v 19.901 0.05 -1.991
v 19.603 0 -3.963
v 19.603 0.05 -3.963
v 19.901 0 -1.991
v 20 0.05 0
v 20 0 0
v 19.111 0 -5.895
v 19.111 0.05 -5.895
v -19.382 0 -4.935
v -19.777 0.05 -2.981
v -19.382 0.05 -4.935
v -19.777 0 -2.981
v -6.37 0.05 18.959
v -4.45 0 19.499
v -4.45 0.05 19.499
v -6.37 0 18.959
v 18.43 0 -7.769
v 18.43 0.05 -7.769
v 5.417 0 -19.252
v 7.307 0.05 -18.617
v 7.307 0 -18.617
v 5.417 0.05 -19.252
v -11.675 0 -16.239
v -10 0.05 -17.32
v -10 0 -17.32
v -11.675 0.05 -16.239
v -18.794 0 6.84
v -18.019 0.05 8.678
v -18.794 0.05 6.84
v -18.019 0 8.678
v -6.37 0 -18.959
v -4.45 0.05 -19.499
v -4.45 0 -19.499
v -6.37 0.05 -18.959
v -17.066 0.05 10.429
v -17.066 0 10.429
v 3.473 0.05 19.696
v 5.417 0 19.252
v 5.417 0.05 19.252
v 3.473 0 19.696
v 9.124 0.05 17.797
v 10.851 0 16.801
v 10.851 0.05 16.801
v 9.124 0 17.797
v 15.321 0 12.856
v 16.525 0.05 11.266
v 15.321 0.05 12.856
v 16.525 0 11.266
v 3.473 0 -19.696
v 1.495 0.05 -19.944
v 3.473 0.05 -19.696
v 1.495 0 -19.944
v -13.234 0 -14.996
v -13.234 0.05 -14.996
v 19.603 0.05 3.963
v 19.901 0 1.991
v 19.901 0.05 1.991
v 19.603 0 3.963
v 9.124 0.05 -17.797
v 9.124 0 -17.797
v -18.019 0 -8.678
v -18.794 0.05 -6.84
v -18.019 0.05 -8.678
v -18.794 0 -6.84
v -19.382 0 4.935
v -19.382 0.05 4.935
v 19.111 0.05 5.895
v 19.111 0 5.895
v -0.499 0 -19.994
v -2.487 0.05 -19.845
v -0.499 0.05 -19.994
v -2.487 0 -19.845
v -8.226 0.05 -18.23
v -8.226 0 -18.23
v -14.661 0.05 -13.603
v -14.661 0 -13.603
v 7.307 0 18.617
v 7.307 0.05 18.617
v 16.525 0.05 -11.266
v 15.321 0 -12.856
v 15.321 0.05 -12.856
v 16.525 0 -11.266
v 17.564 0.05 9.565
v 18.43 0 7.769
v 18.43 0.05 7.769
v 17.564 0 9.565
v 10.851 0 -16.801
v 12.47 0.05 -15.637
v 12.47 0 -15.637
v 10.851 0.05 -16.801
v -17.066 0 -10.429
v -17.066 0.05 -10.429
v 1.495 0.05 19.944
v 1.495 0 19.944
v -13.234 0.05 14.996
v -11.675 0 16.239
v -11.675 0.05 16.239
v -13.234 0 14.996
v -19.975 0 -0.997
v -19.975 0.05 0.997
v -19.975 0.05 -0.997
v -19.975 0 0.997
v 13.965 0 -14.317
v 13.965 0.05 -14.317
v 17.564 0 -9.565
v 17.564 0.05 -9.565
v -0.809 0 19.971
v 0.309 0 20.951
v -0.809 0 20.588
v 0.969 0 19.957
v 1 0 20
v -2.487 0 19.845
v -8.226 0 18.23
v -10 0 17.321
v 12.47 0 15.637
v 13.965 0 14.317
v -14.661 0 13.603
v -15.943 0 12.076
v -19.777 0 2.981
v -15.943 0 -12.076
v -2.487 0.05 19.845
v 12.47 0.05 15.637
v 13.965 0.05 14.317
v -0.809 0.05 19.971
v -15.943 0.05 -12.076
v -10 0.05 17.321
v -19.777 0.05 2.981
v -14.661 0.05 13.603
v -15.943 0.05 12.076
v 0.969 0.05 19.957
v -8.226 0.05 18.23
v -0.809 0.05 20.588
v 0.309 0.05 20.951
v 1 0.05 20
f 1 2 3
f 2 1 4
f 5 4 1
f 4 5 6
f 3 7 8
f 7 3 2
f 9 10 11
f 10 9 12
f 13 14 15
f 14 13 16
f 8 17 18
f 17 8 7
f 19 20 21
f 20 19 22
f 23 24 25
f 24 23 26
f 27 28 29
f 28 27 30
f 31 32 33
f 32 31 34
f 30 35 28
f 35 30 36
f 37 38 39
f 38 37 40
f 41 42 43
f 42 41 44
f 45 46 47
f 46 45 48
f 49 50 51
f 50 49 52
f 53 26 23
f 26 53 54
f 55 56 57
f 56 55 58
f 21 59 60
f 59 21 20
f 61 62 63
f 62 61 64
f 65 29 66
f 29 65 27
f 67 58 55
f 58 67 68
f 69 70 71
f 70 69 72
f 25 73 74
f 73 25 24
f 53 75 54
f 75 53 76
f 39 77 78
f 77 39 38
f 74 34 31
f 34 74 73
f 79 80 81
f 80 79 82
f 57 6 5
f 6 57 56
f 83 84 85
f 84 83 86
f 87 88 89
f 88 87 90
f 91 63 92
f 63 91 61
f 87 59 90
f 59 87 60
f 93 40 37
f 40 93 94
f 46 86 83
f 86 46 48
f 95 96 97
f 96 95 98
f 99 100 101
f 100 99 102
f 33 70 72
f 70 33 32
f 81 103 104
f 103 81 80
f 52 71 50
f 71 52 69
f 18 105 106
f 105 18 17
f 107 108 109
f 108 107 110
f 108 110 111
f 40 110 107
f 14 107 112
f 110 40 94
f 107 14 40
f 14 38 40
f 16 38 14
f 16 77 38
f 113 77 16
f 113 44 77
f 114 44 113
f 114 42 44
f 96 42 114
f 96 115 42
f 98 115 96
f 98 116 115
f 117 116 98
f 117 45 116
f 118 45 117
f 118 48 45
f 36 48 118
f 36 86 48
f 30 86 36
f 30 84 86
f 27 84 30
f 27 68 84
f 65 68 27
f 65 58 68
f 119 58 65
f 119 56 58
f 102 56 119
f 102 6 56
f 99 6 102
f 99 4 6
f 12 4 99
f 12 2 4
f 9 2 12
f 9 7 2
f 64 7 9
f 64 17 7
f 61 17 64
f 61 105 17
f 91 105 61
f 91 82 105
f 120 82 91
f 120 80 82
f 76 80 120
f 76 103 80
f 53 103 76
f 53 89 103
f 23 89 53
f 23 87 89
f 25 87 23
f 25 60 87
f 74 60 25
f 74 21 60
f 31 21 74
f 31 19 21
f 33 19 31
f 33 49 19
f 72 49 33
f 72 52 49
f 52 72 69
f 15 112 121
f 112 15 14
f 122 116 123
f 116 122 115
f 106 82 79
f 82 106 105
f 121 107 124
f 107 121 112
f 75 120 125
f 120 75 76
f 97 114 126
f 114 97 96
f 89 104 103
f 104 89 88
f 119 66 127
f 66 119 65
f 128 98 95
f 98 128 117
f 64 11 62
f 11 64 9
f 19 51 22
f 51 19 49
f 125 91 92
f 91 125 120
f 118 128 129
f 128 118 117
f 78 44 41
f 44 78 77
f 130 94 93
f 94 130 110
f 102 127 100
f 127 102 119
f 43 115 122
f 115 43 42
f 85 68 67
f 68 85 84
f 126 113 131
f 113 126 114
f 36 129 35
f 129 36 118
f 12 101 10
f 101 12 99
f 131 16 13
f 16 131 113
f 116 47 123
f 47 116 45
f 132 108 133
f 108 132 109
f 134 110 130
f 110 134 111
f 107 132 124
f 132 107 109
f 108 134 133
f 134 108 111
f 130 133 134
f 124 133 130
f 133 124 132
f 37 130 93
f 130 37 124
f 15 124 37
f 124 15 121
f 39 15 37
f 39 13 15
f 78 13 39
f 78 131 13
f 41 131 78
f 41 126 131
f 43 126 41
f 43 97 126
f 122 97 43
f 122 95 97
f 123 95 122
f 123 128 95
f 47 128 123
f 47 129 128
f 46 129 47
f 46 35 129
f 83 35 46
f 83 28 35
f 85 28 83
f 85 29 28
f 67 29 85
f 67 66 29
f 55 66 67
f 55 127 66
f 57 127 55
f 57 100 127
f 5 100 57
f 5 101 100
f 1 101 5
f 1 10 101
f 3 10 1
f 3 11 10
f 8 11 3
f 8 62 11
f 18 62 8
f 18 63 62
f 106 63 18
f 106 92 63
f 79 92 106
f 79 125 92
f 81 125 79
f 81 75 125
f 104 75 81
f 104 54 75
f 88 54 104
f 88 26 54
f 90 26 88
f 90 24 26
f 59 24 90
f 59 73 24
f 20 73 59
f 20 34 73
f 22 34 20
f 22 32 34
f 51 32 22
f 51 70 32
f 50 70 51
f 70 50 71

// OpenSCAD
module schuessel (r = 20, t = 0.1, ele = 30, azi = 45, psi = 0, xi = 0)
{
    rotate ([psi, 0, 0])
    rotate ([0, 0, azi])
    rotate ([-ele, 0, 0])
    rotate ([0, -xi, 0])
    rotate ([-90, 0, 0])
        difference () {
        union () {
            cylinder (r = r, h = t);
            translate ([0, -r, 0])
                cylinder (r = 1, h = t);
        }
        translate ([0, 0, t / 2])
            cylinder (r = 2*r, h = t);
        }
}

// This is the case ele = 30, azi = 0
// rotate ([0, -90, 0])
// rotate ([0, 0, -acos (17.3 / 20)])
// rotate ([0, 90, 0])
// schuessel (azi = 0, ele = 30, $fa=1);

// This is the case ele = 60, azi = 0
// rotate ([0, -90, 0])
// rotate ([0, 0, -60])
// rotate ([0, 90, 0])
// schuessel (azi = 0, ele = 60, $fa=1);

// An arbitrary angle
// rotate ([0, -40.967, 0])
// rotate ([0, 0, -69.3])
// rotate ([0, 68, 0])
// schuessel (ele = 60, azi = 45, $fa=1);

// This needs no Y-Rotation
// rotate ([0, 0, -90])
// rotate ([0, 60, 0])
// schuessel (ele = 60, azi = 90, $fa=1);

// Another arbitrary example
// rotate ([0, -27, 0])
// rotate ([0, 0, -75.5])
// rotate ([0, 63.5, 0])
// schuessel (ele = 60, azi = 60, $fa=1);

//schuessel (ele = 0, azi = 0, $fa=1);

// Example with elevation correction:
rotate ([0, -50.924, 0])
rotate ([0, 0, -51.066])
rotate ([0, 62.966, 0])
schuessel (ele = 60, azi = 45, psi = 20, xi = -19.597, $fa=1);
